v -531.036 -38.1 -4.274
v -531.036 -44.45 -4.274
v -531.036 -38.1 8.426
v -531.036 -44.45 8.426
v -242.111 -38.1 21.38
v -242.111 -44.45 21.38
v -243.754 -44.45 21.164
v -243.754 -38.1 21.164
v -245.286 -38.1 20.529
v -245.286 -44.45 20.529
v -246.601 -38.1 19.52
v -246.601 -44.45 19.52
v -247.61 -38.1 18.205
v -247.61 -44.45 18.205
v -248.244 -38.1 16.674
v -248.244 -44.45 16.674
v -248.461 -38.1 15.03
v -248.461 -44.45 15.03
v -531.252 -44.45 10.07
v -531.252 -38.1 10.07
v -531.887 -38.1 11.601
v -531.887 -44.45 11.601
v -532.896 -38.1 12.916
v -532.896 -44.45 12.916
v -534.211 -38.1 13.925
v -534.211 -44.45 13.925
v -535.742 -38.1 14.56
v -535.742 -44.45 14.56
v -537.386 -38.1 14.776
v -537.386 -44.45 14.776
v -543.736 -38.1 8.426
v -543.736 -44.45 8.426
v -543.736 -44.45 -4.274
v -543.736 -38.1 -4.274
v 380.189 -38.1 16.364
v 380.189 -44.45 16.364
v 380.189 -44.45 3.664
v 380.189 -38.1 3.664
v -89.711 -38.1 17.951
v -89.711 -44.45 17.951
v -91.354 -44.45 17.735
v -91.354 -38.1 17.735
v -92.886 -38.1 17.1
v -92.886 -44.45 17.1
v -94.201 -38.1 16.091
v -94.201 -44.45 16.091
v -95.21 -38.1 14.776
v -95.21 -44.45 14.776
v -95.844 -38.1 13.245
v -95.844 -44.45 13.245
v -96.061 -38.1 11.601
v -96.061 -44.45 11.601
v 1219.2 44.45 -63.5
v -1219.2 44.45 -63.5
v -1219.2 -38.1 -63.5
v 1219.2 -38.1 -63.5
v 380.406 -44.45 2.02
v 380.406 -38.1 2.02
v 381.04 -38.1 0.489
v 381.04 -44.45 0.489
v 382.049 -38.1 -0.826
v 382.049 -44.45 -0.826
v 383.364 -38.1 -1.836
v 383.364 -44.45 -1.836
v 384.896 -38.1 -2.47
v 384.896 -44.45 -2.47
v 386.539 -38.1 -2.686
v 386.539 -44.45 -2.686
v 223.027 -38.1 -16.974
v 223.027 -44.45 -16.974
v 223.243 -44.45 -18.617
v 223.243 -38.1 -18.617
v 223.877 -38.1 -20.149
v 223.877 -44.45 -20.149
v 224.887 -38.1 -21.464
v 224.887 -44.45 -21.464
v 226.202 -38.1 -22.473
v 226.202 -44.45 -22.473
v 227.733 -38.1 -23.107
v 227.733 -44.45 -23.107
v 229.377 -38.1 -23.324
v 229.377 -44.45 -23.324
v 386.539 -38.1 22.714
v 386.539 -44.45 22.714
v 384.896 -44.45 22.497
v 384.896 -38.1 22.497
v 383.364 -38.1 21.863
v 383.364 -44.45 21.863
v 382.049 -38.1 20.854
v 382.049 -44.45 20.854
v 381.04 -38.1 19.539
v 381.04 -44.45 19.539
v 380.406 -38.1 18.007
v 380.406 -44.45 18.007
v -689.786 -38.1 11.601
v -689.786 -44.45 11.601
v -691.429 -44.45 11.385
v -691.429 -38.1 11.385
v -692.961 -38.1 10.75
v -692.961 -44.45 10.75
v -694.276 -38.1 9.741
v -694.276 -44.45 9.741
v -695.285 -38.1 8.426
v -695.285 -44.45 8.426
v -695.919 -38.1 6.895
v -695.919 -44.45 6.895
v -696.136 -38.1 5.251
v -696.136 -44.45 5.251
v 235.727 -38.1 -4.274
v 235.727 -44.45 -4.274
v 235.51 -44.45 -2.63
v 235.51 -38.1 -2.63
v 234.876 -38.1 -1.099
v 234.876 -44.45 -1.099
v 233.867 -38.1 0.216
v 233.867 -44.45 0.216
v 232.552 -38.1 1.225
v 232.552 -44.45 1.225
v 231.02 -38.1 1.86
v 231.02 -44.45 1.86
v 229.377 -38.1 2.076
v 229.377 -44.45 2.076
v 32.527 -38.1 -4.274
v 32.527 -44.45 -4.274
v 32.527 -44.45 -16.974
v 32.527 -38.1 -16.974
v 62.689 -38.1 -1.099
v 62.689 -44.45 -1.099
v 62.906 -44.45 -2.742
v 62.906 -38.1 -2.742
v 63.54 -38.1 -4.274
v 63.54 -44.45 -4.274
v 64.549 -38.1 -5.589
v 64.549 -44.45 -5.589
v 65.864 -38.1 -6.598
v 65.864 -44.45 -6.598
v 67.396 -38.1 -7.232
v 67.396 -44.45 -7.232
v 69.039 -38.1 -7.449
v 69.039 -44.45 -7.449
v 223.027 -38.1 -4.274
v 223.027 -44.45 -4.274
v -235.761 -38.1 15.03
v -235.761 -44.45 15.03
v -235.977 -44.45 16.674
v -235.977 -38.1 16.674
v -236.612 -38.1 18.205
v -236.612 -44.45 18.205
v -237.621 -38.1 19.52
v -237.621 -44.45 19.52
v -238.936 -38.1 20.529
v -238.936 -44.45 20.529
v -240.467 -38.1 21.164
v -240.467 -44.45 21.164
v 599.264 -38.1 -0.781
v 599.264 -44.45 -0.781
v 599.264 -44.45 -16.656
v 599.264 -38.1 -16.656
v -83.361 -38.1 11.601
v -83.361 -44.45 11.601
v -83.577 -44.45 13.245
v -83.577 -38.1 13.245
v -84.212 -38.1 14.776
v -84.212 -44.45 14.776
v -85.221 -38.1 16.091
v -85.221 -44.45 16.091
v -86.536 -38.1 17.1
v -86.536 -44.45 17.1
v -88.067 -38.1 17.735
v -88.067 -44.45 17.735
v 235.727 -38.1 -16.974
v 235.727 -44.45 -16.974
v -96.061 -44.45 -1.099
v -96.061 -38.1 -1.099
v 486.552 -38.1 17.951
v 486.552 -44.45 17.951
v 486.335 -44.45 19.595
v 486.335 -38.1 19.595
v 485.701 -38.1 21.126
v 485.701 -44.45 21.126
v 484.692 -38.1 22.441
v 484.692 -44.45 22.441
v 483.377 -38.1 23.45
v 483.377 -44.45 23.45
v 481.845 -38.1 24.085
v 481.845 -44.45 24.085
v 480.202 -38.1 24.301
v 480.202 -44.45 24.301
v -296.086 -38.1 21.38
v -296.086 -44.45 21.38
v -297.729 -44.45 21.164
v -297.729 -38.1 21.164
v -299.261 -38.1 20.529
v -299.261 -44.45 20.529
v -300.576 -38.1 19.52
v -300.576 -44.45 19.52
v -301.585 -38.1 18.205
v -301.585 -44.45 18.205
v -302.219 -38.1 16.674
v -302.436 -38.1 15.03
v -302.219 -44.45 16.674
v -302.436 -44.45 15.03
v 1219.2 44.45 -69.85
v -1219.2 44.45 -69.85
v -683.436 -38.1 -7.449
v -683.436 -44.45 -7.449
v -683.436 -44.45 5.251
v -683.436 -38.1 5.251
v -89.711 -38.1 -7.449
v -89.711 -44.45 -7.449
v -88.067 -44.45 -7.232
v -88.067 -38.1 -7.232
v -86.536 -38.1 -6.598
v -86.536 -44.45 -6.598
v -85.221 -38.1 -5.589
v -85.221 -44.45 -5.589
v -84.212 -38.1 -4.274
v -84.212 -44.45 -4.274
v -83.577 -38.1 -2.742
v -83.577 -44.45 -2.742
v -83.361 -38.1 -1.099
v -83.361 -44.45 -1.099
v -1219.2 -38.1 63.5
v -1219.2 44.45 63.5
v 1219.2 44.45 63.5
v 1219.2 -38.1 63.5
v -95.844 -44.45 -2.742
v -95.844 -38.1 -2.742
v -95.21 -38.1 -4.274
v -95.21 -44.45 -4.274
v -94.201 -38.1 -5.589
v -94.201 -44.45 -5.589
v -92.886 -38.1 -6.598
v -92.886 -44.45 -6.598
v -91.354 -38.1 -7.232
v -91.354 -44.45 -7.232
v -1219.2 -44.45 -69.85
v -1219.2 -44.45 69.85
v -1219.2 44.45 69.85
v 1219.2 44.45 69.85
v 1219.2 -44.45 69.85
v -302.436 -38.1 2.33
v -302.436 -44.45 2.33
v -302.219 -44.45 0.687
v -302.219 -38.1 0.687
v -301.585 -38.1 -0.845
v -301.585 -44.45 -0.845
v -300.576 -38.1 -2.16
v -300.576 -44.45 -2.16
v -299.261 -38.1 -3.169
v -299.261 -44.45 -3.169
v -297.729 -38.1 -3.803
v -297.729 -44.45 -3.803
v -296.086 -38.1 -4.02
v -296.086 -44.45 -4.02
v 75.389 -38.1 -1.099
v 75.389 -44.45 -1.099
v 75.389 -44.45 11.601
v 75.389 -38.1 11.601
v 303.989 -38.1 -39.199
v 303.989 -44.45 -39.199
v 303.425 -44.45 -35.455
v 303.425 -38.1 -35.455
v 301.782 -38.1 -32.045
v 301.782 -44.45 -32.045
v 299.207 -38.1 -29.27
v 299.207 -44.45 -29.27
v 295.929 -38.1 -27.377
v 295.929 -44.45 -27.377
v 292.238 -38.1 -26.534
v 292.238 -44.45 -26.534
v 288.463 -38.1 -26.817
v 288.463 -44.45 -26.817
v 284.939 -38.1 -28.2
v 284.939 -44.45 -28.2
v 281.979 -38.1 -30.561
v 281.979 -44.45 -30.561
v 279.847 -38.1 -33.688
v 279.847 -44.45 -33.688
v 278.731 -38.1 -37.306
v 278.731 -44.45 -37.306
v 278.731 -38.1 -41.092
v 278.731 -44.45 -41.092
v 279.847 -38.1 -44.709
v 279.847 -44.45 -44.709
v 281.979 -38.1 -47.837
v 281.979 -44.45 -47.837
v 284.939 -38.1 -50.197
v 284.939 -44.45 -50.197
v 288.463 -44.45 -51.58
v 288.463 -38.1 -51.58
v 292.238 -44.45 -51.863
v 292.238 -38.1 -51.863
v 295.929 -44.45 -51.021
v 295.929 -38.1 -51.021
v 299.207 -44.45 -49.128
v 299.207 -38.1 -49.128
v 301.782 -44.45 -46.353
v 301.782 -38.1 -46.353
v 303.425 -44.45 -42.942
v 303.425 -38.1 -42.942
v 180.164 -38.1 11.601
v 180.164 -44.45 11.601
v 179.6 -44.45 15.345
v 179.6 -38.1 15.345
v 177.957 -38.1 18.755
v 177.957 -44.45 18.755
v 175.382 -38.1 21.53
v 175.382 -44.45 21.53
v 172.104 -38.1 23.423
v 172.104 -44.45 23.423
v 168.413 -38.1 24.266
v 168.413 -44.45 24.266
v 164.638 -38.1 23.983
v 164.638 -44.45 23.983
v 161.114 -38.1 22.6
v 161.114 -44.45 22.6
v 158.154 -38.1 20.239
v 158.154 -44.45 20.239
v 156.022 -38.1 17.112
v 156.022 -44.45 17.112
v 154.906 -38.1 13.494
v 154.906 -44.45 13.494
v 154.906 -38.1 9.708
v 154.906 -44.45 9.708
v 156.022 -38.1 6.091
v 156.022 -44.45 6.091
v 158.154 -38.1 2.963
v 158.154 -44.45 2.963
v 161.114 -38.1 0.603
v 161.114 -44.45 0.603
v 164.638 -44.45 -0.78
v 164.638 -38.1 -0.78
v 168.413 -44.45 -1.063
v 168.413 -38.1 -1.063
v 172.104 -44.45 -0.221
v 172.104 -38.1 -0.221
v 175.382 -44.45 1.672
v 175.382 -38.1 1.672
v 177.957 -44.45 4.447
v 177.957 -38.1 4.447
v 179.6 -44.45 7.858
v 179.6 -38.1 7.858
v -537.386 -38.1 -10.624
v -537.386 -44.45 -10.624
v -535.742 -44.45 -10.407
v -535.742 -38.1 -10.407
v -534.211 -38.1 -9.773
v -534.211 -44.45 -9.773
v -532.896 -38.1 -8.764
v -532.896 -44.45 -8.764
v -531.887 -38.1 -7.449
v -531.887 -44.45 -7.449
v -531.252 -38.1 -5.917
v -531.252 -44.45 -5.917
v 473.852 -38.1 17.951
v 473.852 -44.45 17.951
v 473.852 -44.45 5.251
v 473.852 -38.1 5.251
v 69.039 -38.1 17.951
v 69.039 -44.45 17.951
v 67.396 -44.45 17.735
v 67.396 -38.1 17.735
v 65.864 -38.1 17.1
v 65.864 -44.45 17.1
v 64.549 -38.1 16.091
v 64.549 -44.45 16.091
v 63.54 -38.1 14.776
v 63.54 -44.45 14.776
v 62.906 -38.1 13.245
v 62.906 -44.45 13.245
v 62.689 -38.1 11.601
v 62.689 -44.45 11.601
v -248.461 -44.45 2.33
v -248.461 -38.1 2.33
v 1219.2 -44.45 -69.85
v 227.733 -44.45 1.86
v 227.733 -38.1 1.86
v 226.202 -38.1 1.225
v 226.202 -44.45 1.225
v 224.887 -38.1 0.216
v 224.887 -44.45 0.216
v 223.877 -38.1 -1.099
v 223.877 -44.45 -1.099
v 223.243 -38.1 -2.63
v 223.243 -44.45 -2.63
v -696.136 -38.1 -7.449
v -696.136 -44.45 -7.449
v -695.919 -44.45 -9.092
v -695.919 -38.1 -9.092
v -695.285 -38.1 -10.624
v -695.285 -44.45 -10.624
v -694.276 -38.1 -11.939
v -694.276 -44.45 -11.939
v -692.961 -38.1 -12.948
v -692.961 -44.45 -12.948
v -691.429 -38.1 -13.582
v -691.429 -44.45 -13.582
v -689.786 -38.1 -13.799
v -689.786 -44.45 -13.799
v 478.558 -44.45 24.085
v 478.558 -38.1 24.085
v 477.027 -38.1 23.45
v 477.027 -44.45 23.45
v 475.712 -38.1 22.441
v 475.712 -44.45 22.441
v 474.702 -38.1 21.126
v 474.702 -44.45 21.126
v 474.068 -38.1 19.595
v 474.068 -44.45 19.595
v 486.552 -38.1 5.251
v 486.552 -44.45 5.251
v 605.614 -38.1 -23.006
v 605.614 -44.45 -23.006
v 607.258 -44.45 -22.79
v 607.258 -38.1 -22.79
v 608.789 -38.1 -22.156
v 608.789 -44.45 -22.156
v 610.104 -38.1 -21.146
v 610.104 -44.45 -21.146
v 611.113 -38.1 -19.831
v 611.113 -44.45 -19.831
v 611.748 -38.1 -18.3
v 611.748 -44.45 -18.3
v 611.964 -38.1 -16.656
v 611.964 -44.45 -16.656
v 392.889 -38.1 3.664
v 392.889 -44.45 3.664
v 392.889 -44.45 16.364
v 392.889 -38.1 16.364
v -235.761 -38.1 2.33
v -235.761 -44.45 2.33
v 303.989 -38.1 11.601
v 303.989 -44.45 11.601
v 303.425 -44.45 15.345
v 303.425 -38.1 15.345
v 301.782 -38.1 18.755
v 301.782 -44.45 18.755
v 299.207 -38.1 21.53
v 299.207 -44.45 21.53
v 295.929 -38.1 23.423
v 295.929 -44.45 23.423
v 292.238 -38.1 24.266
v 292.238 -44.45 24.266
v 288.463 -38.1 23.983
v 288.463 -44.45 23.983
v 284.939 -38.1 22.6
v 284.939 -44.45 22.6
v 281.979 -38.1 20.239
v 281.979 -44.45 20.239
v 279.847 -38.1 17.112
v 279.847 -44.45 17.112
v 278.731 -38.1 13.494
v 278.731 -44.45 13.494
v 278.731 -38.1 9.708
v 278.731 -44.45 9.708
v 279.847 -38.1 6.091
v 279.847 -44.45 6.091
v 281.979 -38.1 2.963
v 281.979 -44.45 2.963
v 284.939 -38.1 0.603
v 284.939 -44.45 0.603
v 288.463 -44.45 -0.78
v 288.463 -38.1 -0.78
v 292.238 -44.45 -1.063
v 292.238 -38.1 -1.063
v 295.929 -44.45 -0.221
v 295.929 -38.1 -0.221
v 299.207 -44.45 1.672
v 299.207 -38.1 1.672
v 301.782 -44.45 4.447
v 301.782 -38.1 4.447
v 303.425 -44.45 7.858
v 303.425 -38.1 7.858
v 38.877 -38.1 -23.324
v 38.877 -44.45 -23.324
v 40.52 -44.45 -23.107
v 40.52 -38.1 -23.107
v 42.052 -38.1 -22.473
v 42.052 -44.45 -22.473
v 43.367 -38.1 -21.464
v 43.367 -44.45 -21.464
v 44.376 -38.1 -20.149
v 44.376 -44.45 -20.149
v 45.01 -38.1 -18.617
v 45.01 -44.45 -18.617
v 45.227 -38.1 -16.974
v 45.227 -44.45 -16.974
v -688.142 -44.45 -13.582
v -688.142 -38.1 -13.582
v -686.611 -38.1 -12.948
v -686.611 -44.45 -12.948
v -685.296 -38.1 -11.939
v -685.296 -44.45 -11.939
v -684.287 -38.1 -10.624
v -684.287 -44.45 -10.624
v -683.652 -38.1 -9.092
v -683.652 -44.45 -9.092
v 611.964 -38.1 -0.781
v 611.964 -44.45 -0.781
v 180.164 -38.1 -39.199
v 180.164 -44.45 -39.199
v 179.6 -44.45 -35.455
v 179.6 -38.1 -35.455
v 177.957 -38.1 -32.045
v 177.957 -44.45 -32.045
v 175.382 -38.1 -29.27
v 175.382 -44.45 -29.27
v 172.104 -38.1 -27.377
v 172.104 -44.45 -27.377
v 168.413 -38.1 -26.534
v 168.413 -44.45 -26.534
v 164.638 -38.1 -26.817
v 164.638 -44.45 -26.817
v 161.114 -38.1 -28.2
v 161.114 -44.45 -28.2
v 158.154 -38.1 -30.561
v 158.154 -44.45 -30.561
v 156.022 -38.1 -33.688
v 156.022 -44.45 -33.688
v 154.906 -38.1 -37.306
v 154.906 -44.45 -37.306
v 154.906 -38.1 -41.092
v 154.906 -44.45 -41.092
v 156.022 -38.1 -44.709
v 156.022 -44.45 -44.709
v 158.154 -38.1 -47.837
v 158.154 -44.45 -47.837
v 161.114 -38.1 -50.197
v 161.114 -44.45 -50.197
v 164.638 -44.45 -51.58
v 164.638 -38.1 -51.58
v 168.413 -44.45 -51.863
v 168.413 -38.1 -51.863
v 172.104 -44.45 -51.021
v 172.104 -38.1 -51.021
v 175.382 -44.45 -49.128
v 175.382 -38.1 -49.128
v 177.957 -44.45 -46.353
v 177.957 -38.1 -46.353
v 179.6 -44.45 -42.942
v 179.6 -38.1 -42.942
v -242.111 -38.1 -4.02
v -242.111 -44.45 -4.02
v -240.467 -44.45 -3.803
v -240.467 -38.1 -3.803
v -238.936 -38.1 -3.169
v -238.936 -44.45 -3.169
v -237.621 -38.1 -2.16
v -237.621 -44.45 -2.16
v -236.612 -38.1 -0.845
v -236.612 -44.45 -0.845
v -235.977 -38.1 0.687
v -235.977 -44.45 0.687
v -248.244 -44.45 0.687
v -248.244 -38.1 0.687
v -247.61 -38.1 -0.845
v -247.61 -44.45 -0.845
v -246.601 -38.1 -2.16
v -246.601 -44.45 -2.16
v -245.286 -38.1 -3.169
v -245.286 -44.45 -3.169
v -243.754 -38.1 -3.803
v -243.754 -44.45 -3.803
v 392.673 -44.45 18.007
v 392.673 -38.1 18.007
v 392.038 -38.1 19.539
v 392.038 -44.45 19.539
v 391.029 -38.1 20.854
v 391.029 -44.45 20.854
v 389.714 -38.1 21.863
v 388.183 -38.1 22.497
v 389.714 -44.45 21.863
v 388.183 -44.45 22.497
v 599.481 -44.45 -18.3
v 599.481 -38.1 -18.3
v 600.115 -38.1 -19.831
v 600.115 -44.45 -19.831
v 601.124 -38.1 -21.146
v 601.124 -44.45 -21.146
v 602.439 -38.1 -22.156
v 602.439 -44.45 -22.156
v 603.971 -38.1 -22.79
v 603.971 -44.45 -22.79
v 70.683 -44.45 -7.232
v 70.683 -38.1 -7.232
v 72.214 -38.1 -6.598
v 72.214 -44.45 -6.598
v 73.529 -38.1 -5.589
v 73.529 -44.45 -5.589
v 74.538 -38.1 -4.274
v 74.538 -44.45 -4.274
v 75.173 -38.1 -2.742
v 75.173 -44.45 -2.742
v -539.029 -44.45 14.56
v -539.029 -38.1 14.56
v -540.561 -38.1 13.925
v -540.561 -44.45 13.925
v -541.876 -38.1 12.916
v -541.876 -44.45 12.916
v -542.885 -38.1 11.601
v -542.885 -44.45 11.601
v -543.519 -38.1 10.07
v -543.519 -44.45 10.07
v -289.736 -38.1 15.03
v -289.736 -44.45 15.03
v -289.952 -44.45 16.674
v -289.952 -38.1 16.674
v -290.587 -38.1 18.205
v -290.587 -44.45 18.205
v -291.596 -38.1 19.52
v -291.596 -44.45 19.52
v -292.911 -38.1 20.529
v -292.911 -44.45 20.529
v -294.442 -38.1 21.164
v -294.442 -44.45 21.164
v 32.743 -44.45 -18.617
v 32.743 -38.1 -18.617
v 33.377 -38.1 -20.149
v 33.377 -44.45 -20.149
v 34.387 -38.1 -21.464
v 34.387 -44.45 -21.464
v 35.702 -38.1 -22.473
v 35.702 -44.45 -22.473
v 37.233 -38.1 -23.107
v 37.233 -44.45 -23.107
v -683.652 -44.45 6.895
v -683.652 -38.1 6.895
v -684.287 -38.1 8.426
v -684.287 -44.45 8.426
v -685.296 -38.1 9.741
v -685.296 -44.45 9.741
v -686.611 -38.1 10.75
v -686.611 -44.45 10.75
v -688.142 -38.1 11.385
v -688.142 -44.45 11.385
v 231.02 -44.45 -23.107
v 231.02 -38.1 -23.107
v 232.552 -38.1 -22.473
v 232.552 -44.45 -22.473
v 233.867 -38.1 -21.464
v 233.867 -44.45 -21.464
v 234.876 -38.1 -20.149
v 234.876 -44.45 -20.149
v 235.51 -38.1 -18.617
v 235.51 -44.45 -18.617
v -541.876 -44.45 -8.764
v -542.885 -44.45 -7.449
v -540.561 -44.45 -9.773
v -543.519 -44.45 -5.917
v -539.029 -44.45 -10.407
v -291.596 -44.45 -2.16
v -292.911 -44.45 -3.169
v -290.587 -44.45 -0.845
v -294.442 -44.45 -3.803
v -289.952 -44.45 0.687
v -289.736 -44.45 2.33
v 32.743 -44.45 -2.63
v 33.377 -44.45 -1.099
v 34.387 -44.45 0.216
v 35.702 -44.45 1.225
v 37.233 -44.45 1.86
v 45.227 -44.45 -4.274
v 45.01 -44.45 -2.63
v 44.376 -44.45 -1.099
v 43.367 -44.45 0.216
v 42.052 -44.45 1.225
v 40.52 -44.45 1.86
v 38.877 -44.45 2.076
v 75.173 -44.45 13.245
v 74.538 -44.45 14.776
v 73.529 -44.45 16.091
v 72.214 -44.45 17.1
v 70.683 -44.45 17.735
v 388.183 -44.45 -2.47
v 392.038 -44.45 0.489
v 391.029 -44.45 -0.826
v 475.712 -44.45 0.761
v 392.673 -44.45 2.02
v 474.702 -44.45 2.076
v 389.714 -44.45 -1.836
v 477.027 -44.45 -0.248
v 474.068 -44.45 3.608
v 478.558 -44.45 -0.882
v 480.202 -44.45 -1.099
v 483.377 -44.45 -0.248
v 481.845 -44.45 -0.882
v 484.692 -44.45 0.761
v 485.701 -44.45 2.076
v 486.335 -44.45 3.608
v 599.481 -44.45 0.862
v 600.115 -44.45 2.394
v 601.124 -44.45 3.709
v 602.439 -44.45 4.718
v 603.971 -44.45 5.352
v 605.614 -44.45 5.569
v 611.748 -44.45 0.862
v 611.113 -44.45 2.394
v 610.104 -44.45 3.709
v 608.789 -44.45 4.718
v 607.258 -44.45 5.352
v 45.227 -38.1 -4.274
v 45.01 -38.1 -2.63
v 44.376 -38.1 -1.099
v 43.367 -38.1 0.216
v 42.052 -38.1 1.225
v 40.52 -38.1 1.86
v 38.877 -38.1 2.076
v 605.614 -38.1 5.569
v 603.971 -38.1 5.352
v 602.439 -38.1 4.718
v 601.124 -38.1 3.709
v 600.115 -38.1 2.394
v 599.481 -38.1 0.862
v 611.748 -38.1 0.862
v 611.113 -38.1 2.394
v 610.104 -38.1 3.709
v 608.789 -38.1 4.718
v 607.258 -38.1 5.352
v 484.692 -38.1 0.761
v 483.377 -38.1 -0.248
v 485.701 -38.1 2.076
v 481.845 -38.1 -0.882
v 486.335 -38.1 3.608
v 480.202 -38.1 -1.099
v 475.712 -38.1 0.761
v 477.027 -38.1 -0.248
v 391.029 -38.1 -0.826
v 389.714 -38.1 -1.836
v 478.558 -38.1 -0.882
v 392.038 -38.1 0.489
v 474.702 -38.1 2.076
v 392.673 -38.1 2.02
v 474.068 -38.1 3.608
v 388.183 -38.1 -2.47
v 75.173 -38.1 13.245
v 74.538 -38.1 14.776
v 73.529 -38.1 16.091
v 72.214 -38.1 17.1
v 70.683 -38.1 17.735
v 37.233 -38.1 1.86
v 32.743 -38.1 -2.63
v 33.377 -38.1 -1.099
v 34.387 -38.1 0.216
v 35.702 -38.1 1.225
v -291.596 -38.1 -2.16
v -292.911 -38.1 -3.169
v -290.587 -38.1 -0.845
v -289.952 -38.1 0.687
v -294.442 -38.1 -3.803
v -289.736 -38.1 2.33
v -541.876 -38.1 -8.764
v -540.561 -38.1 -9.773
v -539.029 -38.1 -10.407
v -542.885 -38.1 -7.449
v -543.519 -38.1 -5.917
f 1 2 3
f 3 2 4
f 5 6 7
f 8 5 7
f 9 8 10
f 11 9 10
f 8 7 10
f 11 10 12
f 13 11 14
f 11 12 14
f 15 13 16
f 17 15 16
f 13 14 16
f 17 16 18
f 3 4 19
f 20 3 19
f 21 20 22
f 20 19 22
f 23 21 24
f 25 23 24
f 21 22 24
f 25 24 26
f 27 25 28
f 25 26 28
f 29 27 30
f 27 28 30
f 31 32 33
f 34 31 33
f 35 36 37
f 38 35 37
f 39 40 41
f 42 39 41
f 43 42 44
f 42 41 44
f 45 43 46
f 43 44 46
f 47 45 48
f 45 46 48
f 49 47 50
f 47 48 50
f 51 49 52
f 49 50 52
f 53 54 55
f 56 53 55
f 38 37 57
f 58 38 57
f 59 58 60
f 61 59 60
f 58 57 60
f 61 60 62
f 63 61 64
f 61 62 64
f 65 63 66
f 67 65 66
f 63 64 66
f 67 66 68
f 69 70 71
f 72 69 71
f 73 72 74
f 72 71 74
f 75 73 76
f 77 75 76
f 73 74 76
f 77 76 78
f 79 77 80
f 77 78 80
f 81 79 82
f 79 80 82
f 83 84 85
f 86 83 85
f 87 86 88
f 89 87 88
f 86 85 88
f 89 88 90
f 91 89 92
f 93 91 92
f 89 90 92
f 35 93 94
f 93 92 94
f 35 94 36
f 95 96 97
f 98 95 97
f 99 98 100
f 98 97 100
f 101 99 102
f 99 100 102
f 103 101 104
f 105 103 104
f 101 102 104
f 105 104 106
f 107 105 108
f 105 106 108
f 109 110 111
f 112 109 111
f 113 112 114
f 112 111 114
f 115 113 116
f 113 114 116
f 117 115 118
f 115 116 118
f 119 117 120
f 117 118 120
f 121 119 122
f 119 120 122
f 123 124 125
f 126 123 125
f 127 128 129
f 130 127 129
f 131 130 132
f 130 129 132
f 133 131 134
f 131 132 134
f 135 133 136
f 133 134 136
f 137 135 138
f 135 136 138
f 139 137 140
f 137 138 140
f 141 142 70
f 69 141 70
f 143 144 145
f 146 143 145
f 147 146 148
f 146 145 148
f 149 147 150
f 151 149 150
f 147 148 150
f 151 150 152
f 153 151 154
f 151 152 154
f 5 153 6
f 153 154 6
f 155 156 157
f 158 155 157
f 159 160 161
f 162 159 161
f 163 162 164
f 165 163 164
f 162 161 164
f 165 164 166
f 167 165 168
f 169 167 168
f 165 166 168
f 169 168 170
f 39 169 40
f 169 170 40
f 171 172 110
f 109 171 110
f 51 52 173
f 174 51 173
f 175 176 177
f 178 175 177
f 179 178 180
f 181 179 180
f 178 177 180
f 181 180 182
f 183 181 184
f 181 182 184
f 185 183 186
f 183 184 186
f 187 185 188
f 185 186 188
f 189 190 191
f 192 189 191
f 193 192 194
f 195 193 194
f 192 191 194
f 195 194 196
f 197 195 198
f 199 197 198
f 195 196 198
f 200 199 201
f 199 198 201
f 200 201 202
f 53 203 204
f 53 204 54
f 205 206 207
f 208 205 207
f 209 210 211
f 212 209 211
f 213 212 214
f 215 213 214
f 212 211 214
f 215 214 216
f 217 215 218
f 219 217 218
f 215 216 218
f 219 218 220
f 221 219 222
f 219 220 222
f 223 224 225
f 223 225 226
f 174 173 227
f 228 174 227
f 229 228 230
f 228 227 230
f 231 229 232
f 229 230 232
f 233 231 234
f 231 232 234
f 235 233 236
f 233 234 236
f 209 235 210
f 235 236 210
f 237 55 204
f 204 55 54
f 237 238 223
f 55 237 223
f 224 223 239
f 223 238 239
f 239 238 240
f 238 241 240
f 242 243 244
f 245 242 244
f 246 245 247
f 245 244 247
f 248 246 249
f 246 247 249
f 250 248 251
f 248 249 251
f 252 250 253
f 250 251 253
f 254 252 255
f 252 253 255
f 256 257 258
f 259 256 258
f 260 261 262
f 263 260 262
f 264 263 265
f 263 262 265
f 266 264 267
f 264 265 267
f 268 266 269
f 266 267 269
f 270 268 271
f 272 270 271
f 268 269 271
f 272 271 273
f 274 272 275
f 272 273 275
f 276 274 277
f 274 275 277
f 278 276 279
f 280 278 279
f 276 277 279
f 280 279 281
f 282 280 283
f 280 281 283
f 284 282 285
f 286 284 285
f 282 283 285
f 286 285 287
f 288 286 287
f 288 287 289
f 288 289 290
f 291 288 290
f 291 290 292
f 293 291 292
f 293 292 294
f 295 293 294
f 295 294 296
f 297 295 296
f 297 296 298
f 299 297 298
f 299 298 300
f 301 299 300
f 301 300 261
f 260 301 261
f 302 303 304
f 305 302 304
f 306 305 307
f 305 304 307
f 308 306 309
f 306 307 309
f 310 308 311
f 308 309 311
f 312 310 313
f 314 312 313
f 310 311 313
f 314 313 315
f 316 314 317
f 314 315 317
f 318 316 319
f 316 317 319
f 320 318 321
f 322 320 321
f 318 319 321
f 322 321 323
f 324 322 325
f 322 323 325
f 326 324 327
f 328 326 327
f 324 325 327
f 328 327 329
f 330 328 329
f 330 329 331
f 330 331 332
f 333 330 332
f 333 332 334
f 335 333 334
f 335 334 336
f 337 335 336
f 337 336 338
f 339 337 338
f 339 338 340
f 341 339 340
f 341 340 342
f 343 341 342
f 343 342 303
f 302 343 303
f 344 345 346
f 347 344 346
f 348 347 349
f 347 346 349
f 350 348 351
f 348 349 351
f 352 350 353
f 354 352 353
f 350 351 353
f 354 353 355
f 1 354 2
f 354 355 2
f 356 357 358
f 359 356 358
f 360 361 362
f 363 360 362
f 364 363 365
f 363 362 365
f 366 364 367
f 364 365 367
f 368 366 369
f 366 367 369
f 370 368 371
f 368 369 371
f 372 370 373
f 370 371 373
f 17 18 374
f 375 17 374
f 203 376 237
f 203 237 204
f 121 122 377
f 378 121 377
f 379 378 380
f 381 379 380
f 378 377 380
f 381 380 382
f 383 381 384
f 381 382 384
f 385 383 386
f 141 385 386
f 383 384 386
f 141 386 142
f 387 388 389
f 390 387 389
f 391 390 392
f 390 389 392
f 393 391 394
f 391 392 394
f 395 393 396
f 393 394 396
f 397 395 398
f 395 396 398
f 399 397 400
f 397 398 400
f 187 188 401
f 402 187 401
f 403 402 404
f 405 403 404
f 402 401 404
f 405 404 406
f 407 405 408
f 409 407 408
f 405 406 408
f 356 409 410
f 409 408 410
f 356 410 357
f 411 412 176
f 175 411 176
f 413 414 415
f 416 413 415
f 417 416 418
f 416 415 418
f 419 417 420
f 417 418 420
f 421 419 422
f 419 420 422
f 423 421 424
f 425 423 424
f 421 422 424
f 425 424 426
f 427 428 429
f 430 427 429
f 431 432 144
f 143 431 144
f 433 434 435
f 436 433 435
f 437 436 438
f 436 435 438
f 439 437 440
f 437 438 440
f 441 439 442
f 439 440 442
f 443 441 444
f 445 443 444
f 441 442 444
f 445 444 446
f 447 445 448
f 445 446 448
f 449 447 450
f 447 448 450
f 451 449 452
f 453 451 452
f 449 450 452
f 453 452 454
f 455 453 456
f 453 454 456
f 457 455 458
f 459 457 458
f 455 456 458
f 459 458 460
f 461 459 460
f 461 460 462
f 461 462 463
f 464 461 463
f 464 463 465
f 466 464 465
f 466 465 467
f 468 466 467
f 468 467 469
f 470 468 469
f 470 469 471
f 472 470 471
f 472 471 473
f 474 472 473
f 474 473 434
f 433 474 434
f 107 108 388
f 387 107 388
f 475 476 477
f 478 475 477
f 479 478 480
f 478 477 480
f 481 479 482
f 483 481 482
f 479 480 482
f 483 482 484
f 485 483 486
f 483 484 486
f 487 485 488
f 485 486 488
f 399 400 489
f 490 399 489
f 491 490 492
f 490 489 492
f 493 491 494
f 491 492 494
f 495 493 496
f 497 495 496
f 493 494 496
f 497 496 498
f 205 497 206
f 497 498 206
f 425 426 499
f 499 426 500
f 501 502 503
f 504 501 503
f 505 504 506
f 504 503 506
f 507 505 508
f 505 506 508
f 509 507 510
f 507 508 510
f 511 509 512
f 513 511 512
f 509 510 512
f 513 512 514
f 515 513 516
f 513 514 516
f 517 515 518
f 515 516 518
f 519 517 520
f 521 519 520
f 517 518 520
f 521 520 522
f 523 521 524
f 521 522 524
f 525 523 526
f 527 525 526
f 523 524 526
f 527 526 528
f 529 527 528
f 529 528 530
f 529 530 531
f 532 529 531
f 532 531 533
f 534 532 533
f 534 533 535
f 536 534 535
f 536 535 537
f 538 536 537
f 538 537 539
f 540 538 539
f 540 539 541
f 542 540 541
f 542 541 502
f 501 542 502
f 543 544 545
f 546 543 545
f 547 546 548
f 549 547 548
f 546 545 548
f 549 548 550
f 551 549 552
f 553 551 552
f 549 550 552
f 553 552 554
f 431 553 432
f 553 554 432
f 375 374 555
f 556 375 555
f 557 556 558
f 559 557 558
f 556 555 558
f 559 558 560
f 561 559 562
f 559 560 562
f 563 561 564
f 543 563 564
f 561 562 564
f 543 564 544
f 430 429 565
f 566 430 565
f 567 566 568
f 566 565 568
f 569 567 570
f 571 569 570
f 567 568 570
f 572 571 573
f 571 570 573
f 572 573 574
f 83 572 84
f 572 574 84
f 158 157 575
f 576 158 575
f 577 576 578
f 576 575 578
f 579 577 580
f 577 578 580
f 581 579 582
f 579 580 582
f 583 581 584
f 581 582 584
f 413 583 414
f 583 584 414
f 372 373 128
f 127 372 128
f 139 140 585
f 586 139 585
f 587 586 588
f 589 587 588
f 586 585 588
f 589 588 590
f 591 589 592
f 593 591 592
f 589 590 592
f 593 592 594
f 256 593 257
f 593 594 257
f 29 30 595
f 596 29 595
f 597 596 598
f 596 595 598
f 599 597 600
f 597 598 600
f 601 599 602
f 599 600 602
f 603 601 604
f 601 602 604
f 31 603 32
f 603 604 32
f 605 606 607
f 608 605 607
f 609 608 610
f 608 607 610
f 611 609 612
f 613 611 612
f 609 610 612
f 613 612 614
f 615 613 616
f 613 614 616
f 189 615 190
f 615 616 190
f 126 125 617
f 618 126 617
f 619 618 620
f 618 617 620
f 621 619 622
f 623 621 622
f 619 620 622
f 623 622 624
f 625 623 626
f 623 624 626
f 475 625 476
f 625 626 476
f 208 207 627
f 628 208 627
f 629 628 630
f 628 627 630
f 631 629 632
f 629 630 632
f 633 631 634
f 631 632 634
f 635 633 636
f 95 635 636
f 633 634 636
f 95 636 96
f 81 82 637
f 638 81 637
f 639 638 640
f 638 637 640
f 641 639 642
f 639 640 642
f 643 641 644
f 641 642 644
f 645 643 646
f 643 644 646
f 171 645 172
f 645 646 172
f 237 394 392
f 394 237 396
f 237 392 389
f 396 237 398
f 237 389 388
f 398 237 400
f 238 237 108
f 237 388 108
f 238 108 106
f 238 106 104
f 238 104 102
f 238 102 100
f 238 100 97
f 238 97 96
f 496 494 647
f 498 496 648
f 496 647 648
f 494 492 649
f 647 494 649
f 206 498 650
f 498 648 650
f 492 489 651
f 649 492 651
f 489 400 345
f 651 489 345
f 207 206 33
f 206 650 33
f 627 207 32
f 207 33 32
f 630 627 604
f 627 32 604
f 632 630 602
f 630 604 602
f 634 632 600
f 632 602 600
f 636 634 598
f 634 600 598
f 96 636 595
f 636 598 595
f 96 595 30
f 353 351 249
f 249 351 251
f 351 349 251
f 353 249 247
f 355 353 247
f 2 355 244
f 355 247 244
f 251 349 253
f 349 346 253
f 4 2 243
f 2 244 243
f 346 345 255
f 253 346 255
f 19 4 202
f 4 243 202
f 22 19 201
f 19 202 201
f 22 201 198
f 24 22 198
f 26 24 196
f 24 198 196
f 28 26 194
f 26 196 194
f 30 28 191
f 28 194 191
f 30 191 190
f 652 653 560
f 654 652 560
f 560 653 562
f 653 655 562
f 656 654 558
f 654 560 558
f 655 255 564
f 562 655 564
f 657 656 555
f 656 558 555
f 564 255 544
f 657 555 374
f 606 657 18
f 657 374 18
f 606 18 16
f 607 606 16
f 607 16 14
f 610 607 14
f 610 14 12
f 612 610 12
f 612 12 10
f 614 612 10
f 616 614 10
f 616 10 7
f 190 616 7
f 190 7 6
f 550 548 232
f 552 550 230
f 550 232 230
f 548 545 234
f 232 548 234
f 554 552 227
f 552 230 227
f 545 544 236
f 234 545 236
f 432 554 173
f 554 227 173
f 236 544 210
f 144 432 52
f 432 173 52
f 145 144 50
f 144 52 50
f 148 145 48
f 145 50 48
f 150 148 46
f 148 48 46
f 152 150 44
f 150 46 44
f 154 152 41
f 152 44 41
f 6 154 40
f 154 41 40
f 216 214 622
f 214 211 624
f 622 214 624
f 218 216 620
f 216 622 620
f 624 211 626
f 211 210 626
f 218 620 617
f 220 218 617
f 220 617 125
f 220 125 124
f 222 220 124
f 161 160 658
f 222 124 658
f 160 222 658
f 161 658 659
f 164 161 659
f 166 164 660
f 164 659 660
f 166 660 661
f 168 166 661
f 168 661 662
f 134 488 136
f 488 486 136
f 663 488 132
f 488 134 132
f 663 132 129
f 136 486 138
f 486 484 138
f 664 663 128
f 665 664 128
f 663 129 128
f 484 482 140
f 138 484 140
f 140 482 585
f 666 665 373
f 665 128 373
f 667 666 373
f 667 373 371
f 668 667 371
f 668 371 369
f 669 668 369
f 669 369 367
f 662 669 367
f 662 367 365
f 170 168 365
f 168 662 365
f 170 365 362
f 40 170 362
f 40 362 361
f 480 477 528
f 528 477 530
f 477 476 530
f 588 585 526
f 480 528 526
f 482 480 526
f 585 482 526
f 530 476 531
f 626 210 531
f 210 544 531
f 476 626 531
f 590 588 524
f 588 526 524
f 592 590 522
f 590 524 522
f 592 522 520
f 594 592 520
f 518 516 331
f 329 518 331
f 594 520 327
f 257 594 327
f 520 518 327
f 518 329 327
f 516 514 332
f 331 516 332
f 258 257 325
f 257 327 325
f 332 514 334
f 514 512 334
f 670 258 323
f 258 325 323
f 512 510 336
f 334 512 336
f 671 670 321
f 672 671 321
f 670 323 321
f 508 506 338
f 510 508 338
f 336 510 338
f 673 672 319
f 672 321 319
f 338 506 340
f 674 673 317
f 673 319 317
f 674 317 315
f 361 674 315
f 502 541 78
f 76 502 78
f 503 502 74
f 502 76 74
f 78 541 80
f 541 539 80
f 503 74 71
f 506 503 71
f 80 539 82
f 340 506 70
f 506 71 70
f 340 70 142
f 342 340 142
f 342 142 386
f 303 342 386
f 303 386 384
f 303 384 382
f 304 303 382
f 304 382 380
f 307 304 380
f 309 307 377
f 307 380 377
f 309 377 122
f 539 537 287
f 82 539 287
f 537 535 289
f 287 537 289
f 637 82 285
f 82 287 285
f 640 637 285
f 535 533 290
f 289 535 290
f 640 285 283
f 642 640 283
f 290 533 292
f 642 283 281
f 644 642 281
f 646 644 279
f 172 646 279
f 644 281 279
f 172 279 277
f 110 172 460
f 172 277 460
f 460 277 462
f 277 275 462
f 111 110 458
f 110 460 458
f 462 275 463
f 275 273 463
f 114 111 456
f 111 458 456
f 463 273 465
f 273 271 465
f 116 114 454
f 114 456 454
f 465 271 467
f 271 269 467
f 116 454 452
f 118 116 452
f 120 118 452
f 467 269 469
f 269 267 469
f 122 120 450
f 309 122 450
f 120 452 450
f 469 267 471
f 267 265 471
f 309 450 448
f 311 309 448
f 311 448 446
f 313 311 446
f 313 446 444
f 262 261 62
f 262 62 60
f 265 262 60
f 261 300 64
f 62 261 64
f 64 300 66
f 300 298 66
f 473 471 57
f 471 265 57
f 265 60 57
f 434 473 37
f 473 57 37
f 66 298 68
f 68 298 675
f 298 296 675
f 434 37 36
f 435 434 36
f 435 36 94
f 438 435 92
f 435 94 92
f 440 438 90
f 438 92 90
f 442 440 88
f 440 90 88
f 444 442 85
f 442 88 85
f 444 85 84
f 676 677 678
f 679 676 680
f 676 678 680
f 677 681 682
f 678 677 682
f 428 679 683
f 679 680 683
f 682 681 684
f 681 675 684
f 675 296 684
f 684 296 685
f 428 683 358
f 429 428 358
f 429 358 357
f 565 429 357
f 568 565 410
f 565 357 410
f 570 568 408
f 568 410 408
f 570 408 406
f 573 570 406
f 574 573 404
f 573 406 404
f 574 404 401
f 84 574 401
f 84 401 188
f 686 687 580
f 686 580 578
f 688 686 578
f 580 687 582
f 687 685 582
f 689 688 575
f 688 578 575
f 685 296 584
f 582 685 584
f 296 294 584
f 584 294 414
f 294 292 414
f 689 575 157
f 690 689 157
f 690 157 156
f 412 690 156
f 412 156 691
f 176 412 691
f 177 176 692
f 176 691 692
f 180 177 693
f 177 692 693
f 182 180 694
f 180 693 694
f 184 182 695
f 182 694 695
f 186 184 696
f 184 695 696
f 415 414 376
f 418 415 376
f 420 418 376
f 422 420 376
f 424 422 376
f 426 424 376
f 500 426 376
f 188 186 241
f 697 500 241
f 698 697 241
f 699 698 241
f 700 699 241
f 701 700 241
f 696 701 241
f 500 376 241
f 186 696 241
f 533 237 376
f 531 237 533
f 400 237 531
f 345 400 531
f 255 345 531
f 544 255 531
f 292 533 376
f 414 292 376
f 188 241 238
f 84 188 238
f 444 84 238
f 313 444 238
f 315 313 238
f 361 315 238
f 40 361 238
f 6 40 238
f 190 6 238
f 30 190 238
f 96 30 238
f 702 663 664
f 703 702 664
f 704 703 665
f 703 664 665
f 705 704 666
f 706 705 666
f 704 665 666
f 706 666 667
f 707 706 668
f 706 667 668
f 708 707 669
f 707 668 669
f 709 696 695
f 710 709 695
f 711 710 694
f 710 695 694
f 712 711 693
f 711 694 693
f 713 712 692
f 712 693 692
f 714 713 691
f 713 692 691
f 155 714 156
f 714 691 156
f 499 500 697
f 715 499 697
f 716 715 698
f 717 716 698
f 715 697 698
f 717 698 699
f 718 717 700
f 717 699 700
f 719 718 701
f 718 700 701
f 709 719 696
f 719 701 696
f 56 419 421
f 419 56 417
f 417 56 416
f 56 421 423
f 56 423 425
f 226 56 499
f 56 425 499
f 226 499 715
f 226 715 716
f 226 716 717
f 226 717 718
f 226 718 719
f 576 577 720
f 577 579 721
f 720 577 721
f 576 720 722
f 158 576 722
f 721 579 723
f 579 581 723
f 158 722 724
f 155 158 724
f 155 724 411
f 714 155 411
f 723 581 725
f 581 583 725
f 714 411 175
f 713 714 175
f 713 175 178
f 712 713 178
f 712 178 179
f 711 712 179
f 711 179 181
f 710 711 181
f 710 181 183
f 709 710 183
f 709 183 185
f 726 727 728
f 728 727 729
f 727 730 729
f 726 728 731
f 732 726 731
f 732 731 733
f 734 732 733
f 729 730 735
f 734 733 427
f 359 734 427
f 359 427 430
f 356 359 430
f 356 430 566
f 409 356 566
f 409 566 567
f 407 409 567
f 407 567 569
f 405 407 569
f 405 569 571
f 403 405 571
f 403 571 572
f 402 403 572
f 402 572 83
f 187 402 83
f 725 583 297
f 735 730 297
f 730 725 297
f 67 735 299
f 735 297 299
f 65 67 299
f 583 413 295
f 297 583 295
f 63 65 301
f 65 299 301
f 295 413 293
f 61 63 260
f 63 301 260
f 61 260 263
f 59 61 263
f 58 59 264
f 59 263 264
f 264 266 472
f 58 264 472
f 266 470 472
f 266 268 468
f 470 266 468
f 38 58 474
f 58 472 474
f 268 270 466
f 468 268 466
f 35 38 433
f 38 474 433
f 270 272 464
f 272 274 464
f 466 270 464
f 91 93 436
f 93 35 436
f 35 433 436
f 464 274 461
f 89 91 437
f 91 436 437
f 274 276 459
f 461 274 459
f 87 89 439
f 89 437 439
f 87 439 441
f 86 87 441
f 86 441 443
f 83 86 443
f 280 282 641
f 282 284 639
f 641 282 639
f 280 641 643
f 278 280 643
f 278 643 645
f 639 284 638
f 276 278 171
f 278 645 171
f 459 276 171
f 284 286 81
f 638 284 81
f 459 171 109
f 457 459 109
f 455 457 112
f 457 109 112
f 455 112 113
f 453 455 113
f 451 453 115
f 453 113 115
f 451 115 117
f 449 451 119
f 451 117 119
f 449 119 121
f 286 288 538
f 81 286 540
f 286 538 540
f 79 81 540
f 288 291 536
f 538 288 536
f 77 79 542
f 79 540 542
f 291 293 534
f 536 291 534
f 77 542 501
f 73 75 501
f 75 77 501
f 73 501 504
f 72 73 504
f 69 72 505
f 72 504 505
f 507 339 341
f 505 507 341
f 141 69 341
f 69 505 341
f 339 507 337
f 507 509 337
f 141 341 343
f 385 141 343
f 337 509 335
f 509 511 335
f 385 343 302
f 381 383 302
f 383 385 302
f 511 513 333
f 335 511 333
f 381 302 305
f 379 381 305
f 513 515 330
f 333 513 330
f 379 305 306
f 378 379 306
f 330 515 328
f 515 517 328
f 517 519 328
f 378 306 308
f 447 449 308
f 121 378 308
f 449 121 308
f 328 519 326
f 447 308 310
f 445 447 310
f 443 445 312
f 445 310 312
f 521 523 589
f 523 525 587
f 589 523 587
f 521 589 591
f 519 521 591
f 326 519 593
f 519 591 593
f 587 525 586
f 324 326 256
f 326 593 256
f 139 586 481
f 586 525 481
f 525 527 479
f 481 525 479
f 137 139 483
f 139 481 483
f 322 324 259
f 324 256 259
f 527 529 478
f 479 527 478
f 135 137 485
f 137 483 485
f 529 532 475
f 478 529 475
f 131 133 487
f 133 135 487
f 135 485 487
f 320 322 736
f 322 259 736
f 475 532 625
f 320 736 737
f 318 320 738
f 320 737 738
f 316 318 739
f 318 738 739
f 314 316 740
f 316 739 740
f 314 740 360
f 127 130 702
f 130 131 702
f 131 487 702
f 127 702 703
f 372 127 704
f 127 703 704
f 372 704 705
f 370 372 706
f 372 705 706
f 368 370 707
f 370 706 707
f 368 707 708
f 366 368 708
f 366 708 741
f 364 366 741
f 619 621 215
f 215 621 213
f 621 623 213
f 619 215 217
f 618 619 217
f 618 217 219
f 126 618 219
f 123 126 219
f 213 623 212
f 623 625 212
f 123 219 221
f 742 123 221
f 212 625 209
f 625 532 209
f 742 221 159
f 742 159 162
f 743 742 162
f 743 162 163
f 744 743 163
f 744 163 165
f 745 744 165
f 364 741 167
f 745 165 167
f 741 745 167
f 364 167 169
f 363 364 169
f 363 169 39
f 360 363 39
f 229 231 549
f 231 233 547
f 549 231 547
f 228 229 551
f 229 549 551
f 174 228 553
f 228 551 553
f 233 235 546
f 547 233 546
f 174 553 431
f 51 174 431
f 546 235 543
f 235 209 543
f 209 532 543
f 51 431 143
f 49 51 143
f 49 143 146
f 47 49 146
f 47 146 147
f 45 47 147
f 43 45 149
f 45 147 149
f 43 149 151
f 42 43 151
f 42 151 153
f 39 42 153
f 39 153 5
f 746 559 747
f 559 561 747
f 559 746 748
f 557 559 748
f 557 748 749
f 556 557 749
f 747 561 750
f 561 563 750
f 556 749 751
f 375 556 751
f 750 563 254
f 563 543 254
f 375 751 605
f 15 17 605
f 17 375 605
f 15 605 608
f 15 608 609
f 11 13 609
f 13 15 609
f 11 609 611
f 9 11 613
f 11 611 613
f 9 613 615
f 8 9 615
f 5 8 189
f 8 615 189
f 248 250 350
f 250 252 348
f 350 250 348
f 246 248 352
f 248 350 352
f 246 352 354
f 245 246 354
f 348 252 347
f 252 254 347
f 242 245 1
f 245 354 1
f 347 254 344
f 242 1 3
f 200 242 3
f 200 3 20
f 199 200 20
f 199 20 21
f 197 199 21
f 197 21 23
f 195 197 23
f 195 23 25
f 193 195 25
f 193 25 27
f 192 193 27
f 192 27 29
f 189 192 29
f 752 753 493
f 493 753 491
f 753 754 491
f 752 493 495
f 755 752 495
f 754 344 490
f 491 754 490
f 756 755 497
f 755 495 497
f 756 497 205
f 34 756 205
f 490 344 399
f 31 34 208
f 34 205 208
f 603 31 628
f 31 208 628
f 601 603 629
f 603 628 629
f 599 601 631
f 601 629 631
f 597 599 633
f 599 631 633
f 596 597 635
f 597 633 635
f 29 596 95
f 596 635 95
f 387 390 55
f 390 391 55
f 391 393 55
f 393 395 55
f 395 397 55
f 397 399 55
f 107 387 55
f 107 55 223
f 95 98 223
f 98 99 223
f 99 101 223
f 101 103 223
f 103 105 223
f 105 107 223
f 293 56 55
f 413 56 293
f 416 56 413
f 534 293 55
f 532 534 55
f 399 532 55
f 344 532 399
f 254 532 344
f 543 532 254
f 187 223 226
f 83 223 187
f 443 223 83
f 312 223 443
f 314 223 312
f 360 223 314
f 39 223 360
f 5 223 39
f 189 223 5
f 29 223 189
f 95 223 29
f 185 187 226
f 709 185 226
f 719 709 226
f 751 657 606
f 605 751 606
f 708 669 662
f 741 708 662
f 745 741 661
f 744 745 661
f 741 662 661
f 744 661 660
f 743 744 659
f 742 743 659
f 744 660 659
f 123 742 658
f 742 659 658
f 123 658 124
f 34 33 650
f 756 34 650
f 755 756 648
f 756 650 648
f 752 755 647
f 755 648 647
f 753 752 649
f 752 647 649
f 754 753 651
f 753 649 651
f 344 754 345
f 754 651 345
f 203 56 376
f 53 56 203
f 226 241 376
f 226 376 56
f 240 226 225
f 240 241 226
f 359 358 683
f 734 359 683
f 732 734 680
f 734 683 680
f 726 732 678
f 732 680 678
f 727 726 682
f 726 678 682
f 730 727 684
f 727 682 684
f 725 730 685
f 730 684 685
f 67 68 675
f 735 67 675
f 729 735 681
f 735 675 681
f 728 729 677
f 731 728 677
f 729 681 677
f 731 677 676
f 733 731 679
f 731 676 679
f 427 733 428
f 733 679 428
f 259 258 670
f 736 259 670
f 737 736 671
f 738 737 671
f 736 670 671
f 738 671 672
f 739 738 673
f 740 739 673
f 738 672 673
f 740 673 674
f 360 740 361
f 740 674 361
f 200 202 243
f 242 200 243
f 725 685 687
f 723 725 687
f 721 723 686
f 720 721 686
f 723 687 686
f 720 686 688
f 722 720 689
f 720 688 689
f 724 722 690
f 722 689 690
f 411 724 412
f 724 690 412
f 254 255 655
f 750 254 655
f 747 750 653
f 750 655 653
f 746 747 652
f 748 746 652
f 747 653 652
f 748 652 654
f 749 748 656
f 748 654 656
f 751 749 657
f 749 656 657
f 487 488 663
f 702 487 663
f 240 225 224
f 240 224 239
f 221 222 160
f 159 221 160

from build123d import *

# Parameters (mm, degrees)
F0_W     = 88.9
F0_H     = 139.7
F1_DEPTH = 1219.2
F2_W     = 82.55
F2_H     = 127
F3_DEPTH = 2438.401
F4_R     = 12.7
F5_DEPTH = 88.901


with BuildPart() as f1:
    # F0 (on Right) → F1 (new body, symmetric)
    with BuildSketch(Plane.YZ):
        Rectangle(F0_W, F0_H)
    extrude(amount=F1_DEPTH, both=True)

    # F2 (on face) → F3 (cut, through all)
    with BuildSketch(Plane(origin=(-1219.2, 0, 0), x_dir=(0, -1, 0), z_dir=(-1, 0, 0))):
        with Locations((-3.175, 0)):
            Rectangle(F2_W, F2_H)
    extrude(amount=-F3_DEPTH, mode=Mode.SUBTRACT)

    # F4 (on face) → F5 (cut, through all)
    with BuildSketch(Plane.XZ.offset(44.45)):
        with BuildLine():
            ThreePointArc((-689.7858705791, 11.6012184261), (-694.2759986397, 9.7413464866), (-696.1358705791, 5.2512184261))
            Line((-696.1358705791, 5.2512184261), (-696.1358705791, -7.4487815739))
            ThreePointArc((-696.1358705791, -7.4487815739), (-694.2759986397, -11.9389096344), (-689.7858705791, -13.7987815739))
            ThreePointArc((-689.7858705791, -13.7987815739), (-685.2957425186, -11.9389096344), (-683.4358705791, -7.4487815739))
            Line((-683.4358705791, -7.4487815739), (-683.4358705791, 5.2512184261))
            ThreePointArc((-683.4358705791, 5.2512184261), (-685.2957425186, 9.7413464866), (-689.7858705791, 11.6012184261))
        make_face()
        with BuildLine():
            ThreePointArc((-537.3858705791, 14.7762184261), (-541.8759986397, 12.9163464866), (-543.7358705791, 8.4262184261))
            Line((-543.7358705791, 8.4262184261), (-543.7358705791, -4.2737815739))
            ThreePointArc((-543.7358705791, -4.2737815739), (-541.8759986397, -8.7639096344), (-537.3858705791, -10.6237815739))
            ThreePointArc((-537.3858705791, -10.6237815739), (-532.8957425186, -8.7639096344), (-531.0358705791, -4.2737815739))
            Line((-531.0358705791, -4.2737815739), (-531.0358705791, 8.4262184261))
            ThreePointArc((-531.0358705791, 8.4262184261), (-532.8957425186, 12.9163464866), (-537.3858705791, 14.7762184261))
        make_face()
        with BuildLine():
            ThreePointArc((-296.0858705791, 21.3802184261), (-300.5759986397, 19.5203464866), (-302.4358705791, 15.0302184261))
            Line((-302.4358705791, 15.0302184261), (-302.4358705791, 2.3302184261))
            ThreePointArc((-302.4358705791, 2.3302184261), (-300.5759986397, -2.1599096344), (-296.0858705791, -4.0197815739))
            ThreePointArc((-296.0858705791, -4.0197815739), (-291.5957425186, -2.1599096344), (-289.7358705791, 2.3302184261))
            Line((-289.7358705791, 2.3302184261), (-289.7358705791, 15.0302184261))
            ThreePointArc((-289.7358705791, 15.0302184261), (-291.5957425186, 19.5203464866), (-296.0858705791, 21.3802184261))
        make_face()
        with BuildLine():
            ThreePointArc((-242.1108705791, 21.3802184261), (-246.6009986397, 19.5203464866), (-248.4608705791, 15.0302184261))
            Line((-248.4608705791, 15.0302184261), (-248.4608705791, 2.3302184261))
            ThreePointArc((-248.4608705791, 2.3302184261), (-246.6009986397, -2.1599096344), (-242.1108705791, -4.0197815739))
            ThreePointArc((-242.1108705791, -4.0197815739), (-237.6207425186, -2.1599096344), (-235.7608705791, 2.3302184261))
            Line((-235.7608705791, 2.3302184261), (-235.7608705791, 15.0302184261))
            ThreePointArc((-235.7608705791, 15.0302184261), (-237.6207425186, 19.5203464866), (-242.1108705791, 21.3802184261))
        make_face()
        with BuildLine():
            ThreePointArc((-89.7108705791, 17.9512184261), (-94.2009986397, 16.0913464866), (-96.0608705791, 11.6012184261))
            Line((-96.0608705791, 11.6012184261), (-96.0608705791, -1.0987815739))
            ThreePointArc((-96.0608705791, -1.0987815739), (-94.2009986397, -5.5889096344), (-89.7108705791, -7.4487815739))
            ThreePointArc((-89.7108705791, -7.4487815739), (-85.2207425186, -5.5889096344), (-83.3608705791, -1.0987815739))
            Line((-83.3608705791, -1.0987815739), (-83.3608705791, 11.6012184261))
            ThreePointArc((-83.3608705791, 11.6012184261), (-85.2207425186, 16.0913464866), (-89.7108705791, 17.9512184261))
        make_face()
        with BuildLine():
            ThreePointArc((38.8766294209, 2.0762184261), (34.3865013603, 0.2163464866), (32.5266294209, -4.2737815739))
            Line((32.5266294209, -4.2737815739), (32.5266294209, -16.9737815739))
            ThreePointArc((32.5266294209, -16.9737815739), (34.3865013603, -21.4639096344), (38.8766294209, -23.3237815739))
            ThreePointArc((38.8766294209, -23.3237815739), (43.3667574814, -21.4639096344), (45.2266294209, -16.9737815739))
            Line((45.2266294209, -16.9737815739), (45.2266294209, -4.2737815739))
            ThreePointArc((45.2266294209, -4.2737815739), (43.3667574814, 0.2163464866), (38.8766294209, 2.0762184261))
        make_face()
        with BuildLine():
            ThreePointArc((69.0391294209, 17.9512184261), (64.5490013603, 16.0913464866), (62.6891294209, 11.6012184261))
            Line((62.6891294209, 11.6012184261), (62.6891294209, -1.0987815739))
            ThreePointArc((62.6891294209, -1.0987815739), (64.5490013603, -5.5889096344), (69.0391294209, -7.4487815739))
            ThreePointArc((69.0391294209, -7.4487815739), (73.5292574814, -5.5889096344), (75.3891294209, -1.0987815739))
            Line((75.3891294209, -1.0987815739), (75.3891294209, 11.6012184261))
            ThreePointArc((75.3891294209, 11.6012184261), (73.5292574814, 16.0913464866), (69.0391294209, 17.9512184261))
        make_face()
        with BuildLine():
            ThreePointArc((229.3766294209, 2.0762184261), (224.8865013603, 0.2163464866), (223.0266294209, -4.2737815739))
            Line((223.0266294209, -4.2737815739), (223.0266294209, -16.9737815739))
            ThreePointArc((223.0266294209, -16.9737815739), (224.8865013603, -21.4639096344), (229.3766294209, -23.3237815739))
            ThreePointArc((229.3766294209, -23.3237815739), (233.8667574814, -21.4639096344), (235.7266294209, -16.9737815739))
            Line((235.7266294209, -16.9737815739), (235.7266294209, -4.2737815739))
            ThreePointArc((235.7266294209, -4.2737815739), (233.8667574814, 0.2163464866), (229.3766294209, 2.0762184261))
        make_face()
        with BuildLine():
            ThreePointArc((386.5391294209, 22.7137184261), (382.0490013603, 20.8538464866), (380.1891294209, 16.3637184261))
            Line((380.1891294209, 16.3637184261), (380.1891294209, 3.6637184261))
            ThreePointArc((380.1891294209, 3.6637184261), (382.0490013603, -0.8264096344), (386.5391294209, -2.6862815739))
            ThreePointArc((386.5391294209, -2.6862815739), (391.0292574814, -0.8264096344), (392.8891294209, 3.6637184261))
            Line((392.8891294209, 3.6637184261), (392.8891294209, 16.3637184261))
            ThreePointArc((392.8891294209, 16.3637184261), (391.0292574814, 20.8538464866), (386.5391294209, 22.7137184261))
        make_face()
        with BuildLine():
            ThreePointArc((480.2016294209, 24.3012184261), (475.7115013603, 22.4413464866), (473.8516294209, 17.9512184261))
            Line((473.8516294209, 17.9512184261), (473.8516294209, 5.2512184261))
            ThreePointArc((473.8516294209, 5.2512184261), (475.7115013603, 0.7610903656), (480.2016294209, -1.0987815739))
            ThreePointArc((480.2016294209, -1.0987815739), (484.6917574814, 0.7610903656), (486.5516294209, 5.2512184261))
            Line((486.5516294209, 5.2512184261), (486.5516294209, 17.9512184261))
            ThreePointArc((486.5516294209, 17.9512184261), (484.6917574814, 22.4413464866), (480.2016294209, 24.3012184261))
        make_face()
        with BuildLine():
            ThreePointArc((605.6141294209, 5.5687184261), (601.1240013603, 3.7088464866), (599.2641294209, -0.7812815739))
            Line((599.2641294209, -0.7812815739), (599.2641294209, -16.6562815739))
            ThreePointArc((599.2641294209, -16.6562815739), (601.1240013603, -21.1464096344), (605.6141294209, -23.0062815739))
            ThreePointArc((605.6141294209, -23.0062815739), (610.1042574814, -21.1464096344), (611.9641294209, -16.6562815739))
            Line((611.9641294209, -16.6562815739), (611.9641294209, -0.7812815739))
            ThreePointArc((611.9641294209, -0.7812815739), (610.1042574814, 3.7088464866), (605.6141294209, 5.5687184261))
        make_face()
        with Locations((167.4641294209, 11.6012184261)):
            Circle(F4_R)
        with Locations((291.2891294209, 11.6012184261)):
            Circle(F4_R)
        with Locations((291.2891294209, -39.1987815739)):
            Circle(F4_R)
        with Locations((167.4641294209, -39.1987815739)):
            Circle(F4_R)
    extrude(amount=-F5_DEPTH, mode=Mode.SUBTRACT)


solid = f1.part
